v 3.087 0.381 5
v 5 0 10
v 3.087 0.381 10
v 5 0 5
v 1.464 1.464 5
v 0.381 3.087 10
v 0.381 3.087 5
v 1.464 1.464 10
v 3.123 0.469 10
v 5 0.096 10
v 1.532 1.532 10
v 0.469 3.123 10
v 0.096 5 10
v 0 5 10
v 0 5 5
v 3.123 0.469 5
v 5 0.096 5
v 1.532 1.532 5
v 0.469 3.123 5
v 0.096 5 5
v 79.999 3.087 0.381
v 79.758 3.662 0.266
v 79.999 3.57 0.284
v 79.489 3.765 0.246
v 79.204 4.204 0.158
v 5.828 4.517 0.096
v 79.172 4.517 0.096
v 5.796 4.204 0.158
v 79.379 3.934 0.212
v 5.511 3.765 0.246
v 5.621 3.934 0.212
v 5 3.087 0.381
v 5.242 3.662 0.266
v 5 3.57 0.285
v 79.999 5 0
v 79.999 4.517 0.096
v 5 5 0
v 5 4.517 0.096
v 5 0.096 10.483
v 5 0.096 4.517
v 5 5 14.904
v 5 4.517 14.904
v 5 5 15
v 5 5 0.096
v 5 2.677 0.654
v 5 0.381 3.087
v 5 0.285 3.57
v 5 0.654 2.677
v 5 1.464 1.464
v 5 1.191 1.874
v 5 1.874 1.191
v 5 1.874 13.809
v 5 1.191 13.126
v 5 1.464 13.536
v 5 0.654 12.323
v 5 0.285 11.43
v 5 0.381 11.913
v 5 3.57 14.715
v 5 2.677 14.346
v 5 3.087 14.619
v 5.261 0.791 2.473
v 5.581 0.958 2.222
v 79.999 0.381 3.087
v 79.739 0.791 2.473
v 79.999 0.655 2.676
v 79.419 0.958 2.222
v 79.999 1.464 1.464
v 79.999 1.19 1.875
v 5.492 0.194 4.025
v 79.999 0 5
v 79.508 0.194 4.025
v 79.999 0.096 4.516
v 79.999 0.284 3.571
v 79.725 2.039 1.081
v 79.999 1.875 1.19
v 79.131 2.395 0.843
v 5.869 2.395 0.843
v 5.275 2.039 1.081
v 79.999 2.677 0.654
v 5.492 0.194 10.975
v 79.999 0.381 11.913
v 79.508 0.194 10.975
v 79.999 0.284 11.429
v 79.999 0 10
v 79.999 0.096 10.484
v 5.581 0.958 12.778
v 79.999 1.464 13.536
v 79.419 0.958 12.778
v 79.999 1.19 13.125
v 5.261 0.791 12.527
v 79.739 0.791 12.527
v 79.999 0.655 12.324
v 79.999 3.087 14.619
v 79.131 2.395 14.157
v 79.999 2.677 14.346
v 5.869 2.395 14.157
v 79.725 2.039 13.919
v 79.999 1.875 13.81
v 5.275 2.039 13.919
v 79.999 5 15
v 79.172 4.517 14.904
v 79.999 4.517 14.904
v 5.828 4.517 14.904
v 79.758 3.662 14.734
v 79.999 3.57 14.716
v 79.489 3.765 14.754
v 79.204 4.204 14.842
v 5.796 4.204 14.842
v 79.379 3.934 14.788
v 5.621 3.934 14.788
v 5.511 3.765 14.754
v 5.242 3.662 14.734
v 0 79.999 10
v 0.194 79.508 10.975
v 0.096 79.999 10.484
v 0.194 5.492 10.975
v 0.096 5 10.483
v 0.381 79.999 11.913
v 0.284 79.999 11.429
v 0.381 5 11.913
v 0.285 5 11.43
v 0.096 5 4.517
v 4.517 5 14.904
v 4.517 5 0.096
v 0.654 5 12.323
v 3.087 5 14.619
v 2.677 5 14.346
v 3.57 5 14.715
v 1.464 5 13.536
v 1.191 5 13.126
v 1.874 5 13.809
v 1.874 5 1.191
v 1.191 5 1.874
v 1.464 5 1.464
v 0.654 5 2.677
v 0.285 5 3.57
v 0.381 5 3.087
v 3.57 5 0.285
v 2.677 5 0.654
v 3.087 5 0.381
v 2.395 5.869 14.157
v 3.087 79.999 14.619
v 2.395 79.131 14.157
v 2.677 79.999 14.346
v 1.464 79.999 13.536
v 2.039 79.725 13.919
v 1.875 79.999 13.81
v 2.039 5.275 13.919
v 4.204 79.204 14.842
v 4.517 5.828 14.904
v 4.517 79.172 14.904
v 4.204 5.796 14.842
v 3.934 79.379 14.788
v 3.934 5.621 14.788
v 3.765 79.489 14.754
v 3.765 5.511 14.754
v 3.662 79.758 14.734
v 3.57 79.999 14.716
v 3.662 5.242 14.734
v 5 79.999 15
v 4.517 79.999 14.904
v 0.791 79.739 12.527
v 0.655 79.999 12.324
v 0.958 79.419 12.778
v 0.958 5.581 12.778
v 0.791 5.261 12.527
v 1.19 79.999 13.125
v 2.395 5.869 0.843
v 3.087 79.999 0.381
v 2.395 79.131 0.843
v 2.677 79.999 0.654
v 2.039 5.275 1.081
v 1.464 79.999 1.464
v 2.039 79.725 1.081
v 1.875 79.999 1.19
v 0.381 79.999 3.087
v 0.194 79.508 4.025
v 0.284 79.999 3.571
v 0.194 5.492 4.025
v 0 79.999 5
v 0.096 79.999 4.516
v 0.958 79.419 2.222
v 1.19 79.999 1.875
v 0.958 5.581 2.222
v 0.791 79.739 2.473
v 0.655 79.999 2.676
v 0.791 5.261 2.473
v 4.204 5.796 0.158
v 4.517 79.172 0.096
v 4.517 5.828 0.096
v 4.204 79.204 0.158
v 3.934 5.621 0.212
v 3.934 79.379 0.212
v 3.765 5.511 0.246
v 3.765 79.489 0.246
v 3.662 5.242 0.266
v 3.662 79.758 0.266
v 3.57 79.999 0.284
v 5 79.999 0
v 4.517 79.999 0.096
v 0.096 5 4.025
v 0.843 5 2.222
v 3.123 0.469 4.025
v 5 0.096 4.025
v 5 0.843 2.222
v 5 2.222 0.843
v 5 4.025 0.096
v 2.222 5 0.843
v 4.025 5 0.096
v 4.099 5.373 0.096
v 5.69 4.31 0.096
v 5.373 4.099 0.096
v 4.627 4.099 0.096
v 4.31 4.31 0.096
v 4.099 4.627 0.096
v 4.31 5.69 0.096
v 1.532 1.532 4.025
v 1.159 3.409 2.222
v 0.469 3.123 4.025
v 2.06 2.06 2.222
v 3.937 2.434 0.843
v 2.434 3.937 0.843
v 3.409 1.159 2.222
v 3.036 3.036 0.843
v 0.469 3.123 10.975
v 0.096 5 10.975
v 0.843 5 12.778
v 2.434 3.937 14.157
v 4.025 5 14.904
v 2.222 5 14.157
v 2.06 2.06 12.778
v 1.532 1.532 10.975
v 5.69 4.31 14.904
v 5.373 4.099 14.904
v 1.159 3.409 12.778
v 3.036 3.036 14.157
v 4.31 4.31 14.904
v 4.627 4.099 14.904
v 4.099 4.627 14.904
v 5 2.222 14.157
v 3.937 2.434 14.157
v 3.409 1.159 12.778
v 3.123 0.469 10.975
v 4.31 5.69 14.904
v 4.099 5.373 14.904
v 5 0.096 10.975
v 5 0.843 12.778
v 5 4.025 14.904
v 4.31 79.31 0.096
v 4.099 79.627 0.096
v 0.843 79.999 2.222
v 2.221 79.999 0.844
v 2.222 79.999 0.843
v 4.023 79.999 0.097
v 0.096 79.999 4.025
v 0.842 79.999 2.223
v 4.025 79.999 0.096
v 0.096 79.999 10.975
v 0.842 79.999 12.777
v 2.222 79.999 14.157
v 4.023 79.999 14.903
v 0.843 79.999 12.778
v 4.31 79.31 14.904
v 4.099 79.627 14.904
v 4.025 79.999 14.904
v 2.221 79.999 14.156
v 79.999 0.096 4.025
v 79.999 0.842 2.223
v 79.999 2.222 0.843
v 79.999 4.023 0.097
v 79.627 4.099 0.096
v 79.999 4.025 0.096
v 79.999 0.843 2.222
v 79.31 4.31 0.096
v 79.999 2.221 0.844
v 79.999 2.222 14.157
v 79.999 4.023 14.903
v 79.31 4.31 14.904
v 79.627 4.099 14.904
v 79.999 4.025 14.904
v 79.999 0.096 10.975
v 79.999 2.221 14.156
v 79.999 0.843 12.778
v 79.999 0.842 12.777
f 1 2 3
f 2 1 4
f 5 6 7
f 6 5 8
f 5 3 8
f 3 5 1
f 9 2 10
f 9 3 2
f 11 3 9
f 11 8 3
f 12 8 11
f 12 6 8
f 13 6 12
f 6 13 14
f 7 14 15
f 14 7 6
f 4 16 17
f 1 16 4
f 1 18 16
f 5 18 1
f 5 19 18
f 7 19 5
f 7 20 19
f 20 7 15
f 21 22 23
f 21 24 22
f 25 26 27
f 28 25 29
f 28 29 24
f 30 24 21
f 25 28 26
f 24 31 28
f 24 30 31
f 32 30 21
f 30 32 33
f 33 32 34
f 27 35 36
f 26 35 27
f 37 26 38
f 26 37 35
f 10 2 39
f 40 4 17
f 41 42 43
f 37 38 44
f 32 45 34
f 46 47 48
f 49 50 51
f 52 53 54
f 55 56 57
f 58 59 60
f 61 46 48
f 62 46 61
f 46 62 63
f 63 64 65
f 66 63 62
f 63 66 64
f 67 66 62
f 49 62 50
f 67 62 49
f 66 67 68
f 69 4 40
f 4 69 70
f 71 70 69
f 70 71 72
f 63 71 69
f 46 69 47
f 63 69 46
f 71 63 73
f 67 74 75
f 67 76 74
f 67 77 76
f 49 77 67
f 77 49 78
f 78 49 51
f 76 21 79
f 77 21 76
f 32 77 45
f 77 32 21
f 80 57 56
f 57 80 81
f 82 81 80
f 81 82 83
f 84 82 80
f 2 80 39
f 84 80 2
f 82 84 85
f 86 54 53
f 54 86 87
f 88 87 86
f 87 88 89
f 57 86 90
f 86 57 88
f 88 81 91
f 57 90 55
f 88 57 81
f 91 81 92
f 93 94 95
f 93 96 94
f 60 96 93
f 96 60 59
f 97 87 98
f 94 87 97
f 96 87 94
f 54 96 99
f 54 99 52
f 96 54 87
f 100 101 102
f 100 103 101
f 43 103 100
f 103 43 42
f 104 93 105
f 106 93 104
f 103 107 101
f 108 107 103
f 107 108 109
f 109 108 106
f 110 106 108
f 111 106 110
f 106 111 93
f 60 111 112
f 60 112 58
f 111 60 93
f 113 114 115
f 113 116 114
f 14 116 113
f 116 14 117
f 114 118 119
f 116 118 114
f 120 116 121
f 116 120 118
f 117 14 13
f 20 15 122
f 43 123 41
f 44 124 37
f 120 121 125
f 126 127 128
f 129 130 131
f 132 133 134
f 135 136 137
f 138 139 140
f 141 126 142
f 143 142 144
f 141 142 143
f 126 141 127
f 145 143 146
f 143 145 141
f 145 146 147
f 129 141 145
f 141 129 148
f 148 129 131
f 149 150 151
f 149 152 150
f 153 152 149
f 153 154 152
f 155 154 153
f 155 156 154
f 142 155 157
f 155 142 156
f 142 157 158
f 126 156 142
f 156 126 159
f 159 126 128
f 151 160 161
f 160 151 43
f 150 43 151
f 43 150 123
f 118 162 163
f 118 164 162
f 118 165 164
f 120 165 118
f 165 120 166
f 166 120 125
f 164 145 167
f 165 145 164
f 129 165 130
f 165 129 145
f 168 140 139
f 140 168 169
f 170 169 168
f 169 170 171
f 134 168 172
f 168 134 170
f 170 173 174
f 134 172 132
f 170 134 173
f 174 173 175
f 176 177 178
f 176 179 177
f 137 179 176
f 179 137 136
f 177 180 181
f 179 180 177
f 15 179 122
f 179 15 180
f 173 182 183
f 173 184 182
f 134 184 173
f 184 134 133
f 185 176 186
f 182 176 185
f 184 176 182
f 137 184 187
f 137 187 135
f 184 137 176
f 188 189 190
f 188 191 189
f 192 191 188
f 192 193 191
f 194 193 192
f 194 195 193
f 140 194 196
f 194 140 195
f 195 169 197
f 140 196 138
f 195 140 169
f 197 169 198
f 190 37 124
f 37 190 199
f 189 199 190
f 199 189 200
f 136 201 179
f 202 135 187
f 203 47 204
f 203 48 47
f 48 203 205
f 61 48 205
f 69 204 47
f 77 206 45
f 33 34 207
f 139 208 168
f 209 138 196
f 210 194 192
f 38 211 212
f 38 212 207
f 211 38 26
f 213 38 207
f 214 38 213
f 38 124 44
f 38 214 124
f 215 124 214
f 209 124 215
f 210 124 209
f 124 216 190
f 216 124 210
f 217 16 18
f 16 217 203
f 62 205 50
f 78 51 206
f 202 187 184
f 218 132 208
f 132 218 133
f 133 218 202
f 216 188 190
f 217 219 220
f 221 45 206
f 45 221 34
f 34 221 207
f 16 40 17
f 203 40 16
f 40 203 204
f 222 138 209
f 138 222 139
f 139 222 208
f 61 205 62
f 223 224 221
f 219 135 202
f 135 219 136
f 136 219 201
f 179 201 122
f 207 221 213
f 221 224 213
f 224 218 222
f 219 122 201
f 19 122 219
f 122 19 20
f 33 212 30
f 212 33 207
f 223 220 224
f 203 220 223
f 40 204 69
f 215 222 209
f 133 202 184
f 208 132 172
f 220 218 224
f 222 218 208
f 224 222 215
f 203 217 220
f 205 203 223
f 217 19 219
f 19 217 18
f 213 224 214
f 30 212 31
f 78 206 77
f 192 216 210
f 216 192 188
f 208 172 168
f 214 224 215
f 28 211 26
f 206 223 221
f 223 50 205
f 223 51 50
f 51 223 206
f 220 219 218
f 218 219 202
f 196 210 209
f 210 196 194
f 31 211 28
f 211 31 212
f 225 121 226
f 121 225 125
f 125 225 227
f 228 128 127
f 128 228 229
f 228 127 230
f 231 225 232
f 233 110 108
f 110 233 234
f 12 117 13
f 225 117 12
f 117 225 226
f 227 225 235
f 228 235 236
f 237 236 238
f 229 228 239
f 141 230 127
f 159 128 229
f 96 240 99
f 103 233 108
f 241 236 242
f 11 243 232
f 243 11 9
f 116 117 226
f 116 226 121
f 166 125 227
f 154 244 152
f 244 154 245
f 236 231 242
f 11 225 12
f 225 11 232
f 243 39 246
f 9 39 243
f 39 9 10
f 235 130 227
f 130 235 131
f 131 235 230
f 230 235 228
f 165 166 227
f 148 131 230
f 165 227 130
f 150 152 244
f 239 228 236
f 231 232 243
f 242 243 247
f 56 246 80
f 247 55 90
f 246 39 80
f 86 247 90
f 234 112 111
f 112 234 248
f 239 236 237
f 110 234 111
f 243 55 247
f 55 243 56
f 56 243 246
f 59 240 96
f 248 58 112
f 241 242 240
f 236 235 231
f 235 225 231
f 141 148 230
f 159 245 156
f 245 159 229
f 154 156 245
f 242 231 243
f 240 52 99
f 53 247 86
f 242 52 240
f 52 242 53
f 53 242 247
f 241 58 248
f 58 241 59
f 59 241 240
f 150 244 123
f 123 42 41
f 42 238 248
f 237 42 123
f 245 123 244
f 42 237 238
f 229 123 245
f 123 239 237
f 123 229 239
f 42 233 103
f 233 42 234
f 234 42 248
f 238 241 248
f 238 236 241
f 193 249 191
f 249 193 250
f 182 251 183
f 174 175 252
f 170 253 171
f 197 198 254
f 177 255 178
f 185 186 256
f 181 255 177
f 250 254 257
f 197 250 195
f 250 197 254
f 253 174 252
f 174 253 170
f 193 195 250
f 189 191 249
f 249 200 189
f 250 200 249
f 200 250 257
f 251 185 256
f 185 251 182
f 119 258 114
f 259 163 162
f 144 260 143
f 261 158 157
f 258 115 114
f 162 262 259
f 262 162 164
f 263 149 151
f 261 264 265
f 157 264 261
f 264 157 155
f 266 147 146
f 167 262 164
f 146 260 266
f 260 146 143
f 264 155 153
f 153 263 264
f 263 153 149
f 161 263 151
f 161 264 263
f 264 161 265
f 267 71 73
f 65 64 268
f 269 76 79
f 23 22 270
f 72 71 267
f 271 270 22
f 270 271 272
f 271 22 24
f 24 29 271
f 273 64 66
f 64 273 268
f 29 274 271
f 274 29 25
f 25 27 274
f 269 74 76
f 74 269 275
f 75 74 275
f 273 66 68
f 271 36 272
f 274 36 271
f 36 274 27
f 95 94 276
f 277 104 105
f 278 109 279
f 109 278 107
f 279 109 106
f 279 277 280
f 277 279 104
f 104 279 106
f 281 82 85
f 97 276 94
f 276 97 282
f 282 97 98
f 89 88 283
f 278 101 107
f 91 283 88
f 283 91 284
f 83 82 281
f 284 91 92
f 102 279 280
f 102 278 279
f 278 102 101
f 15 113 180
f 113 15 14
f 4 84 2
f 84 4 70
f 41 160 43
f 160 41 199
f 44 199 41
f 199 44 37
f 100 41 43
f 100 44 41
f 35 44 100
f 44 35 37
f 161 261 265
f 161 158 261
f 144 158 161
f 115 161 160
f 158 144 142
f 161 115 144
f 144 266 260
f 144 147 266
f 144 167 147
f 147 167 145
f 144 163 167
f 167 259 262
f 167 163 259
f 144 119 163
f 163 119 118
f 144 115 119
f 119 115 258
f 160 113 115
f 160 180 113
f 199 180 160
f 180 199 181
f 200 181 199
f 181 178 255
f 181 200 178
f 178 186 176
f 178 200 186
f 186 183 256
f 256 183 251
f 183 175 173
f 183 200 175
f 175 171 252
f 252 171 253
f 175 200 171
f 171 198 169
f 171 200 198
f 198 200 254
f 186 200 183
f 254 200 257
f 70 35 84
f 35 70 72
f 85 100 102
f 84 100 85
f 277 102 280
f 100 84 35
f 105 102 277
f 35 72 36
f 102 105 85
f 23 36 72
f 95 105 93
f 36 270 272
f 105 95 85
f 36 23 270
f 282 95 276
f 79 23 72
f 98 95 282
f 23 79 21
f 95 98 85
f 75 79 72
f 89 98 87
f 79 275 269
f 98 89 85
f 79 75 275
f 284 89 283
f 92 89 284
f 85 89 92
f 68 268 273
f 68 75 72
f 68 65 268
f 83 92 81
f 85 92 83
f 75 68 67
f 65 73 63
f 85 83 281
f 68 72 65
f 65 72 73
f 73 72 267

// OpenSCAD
// file: config.scad
use <common.scad>

$fa = 1;
$fs = 0.4;

board_depth = 15;
board_r = 5;
grid_x = 9;
grid_y = 9;
grid_spacing_x = 25;
grid_spacing_y = 25;
line_thickness = 1.5;
margin_x = 12.5;
margin_y = 12.5;
peg_h = 13.5;
peg_r = 3.5;
hole_tolerance = 0.5;

stone_r = 11;
stone_h = 4.5;
bump_r = 2;
bump_h = 1.5;

fin_length = 6;
fin_thickness = 3;
fin_margin = 6;
mag_r = 5;
mag_h = 4;
interconnect_tolerance = 0.25;

bx = board_dim(grid_x, line_thickness, grid_spacing_x, margin_x);
by = board_dim(grid_y, line_thickness, grid_spacing_y, margin_y);
bz = board_depth+line_thickness;

hfin = ((bx / 3) - (4 * fin_margin) - (2 * mag_r)) / 2;
vfin = ((by / 3) - (4 * fin_margin) - (2 * mag_r)) / 2;
// file: common.scad
include <config.scad>
use <MCAD/boxes.scad>

function board_dim(num_lines, line_thickness, spacing, margin) = 
  (num_lines * (line_thickness + spacing)) + (2 * margin) - spacing;

module grid(x, y, spacing_x, spacing_y, line) {
  width = ((x - 1) * spacing_x) + (x * line);
  height = ((y - 1) * spacing_y) + (y * line);
  for(i = [0:x-1]) {
    translate([(-width / 2) + (i * (spacing_x + line)) + line/2, 0, 0])
    rotate([90, 0, 0])
    cylinder(h=height, r=line/2, center=true);
  }
  for(i = [0:y-1]) {
    translate([0, (-height / 2) + (i * (spacing_y + line)) + line/2, 0])
    rotate([0, 90, 0])
    cylinder(h=width, r=line/2, center=true);
  }
}

module ishi(stone_rxy, stone_rz, peg_r, peg_h, bump_rxy, bump_rz) {
  union() {
    resize([stone_rxy*2, stone_rxy*2, stone_rz*2])
    sphere(r=stone_rxy);

    hull() {
      translate([0, 0, -(peg_h + stone_rz)/2])
      cylinder(h=peg_h + stone_rz, r=peg_r, center=true);

      translate([0, 0, stone_rz])
      resize([2*bump_rxy, 2*bump_rxy, 2*bump_rz])
      sphere(r=bump_rxy);
    }
  }
}

module board(x=grid_x, y=grid_y) {
  difference() {
    union() {
      roundedBox([board_dim(x, line_thickness, grid_spacing_x, margin_x), board_dim(y, line_thickness, grid_spacing_y, margin_y), board_depth], board_r);
      translate([0, 0, board_depth / 2])
      scale([1, 1, 2])
      grid(x, y, grid_spacing_x, grid_spacing_y, line_thickness);
    }
    
    width = ((x - 1) * grid_spacing_x) + (x * line_thickness);
    height = ((y - 1) * grid_spacing_y) + (y * line_thickness);
    for(i = [0:x-1]) {
      for(j = [0:y-1]) {
        translate([(-width / 2) + (i * (grid_spacing_x + line_thickness)) + line_thickness/2, (-height / 2) + (j * (grid_spacing_y + line_thickness)) + line_thickness/2, ((board_depth / 2) + line_thickness) - (peg_h / 2) + 0.001])
        cylinder(h=peg_h, r=peg_r + hole_tolerance, center=true);
      }
    } 
  }
}
// file: point.scad
use <common.scad>
include <config.scad>

function count(a, b) = a || b ? a && b ? 2 : 1 : 0;

module point(bredth, depth, line_width, hole_depth, hole_radius,
             n=true, e=true, s=true, w=true) {
  /* Single point for composition into larger pieces.
   *
   * The produced point will have dimensions [bredth, bredth, depth+line_width],
   * and will continue in the positive direction from the origin along all axes.
   *
   * Parameters:
   * bredth: The width/height of the point (i.e., distance between lines).
   * depth: Depth of the point (i.e., thickness of the board).
   * line_width: Thickness of the lines. Lines will have a footprint this wide,
   *             and will also be raised this far from the rest of the board.
   * hole_depth: How deep the holes for the ishi should be, measured from the
   *             top of the lines.
   * hole_radius: Radius of the holes for the ishi. Should include any
   *              necessary tolerance.
   * n, e, s, w: Whether or not to produce the northern, eastern, western and
   *             southern lines, respectively. Default true.
   */
  difference() {
    union() {
      // Base of the point.
      cube(size=[bredth, bredth, depth]);

      // Horizontal (east-west) line.
      translate([e && !w ? bredth/2 : 0, bredth/2, depth])
      scale([1, 1, 2])
      rotate([0, 90, 0])
      cylinder(h=count(e, w)*bredth/2, d=line_width);

      // Vertical (north-south) line.
      translate([bredth/2, n && !s ? bredth/2 : 0, depth])
      scale([1, 1, 2])
      rotate([-90, 0, 0])
      cylinder(h=count(n, s)*bredth/2, d=line_width);
    }
    // Stone hole.
    translate([bredth/2, bredth/2, depth + line_width - hole_depth])
    cylinder(h=hole_depth, r=hole_radius);
  }
}

point(bredth=grid_spacing, depth=board_depth, line_width=line_width,
             hole_depth=peg_h, hole_radius=peg_r+hole_tolerance);
// main file
use <MCAD/boxes.scad>
use <point.scad>

module frame(size, radius, north=true, east=true, south=true, west=true) {
  rsize = size+[2*radius, 2*radius, 0];
  difference() {
    translate(rsize/2)
    roundedBox(rsize, radius, false);
    union() {
      translate([radius, radius, -0.001])
      cube(size+[0, 0, 0.002]);
      if (!north)
      translate([-0.001, size.y+radius-0.001, -0.001])
      cube(size=[rsize.x+0.002, radius+0.002, rsize.z+0.002]);
      if (!east)
      translate([size.x+radius-0.001, -0.001, -0.001])
      cube(size=[radius+0.002, rsize.y+0.002, rsize.z+0.002]);
      if (!south)
      translate([-0.001, -0.001, -0.001])
      cube(size=[rsize.x+0.002, radius+0.002, rsize.z+0.002]);
      if (!west)
      translate([-0.001, -0.001, -0.001])
      cube(size=[radius+0.002, rsize.y+0.002, rsize.z+0.002]);
    }
  }
}

frame([75, 75, 15], 5, north=false, east=false);
